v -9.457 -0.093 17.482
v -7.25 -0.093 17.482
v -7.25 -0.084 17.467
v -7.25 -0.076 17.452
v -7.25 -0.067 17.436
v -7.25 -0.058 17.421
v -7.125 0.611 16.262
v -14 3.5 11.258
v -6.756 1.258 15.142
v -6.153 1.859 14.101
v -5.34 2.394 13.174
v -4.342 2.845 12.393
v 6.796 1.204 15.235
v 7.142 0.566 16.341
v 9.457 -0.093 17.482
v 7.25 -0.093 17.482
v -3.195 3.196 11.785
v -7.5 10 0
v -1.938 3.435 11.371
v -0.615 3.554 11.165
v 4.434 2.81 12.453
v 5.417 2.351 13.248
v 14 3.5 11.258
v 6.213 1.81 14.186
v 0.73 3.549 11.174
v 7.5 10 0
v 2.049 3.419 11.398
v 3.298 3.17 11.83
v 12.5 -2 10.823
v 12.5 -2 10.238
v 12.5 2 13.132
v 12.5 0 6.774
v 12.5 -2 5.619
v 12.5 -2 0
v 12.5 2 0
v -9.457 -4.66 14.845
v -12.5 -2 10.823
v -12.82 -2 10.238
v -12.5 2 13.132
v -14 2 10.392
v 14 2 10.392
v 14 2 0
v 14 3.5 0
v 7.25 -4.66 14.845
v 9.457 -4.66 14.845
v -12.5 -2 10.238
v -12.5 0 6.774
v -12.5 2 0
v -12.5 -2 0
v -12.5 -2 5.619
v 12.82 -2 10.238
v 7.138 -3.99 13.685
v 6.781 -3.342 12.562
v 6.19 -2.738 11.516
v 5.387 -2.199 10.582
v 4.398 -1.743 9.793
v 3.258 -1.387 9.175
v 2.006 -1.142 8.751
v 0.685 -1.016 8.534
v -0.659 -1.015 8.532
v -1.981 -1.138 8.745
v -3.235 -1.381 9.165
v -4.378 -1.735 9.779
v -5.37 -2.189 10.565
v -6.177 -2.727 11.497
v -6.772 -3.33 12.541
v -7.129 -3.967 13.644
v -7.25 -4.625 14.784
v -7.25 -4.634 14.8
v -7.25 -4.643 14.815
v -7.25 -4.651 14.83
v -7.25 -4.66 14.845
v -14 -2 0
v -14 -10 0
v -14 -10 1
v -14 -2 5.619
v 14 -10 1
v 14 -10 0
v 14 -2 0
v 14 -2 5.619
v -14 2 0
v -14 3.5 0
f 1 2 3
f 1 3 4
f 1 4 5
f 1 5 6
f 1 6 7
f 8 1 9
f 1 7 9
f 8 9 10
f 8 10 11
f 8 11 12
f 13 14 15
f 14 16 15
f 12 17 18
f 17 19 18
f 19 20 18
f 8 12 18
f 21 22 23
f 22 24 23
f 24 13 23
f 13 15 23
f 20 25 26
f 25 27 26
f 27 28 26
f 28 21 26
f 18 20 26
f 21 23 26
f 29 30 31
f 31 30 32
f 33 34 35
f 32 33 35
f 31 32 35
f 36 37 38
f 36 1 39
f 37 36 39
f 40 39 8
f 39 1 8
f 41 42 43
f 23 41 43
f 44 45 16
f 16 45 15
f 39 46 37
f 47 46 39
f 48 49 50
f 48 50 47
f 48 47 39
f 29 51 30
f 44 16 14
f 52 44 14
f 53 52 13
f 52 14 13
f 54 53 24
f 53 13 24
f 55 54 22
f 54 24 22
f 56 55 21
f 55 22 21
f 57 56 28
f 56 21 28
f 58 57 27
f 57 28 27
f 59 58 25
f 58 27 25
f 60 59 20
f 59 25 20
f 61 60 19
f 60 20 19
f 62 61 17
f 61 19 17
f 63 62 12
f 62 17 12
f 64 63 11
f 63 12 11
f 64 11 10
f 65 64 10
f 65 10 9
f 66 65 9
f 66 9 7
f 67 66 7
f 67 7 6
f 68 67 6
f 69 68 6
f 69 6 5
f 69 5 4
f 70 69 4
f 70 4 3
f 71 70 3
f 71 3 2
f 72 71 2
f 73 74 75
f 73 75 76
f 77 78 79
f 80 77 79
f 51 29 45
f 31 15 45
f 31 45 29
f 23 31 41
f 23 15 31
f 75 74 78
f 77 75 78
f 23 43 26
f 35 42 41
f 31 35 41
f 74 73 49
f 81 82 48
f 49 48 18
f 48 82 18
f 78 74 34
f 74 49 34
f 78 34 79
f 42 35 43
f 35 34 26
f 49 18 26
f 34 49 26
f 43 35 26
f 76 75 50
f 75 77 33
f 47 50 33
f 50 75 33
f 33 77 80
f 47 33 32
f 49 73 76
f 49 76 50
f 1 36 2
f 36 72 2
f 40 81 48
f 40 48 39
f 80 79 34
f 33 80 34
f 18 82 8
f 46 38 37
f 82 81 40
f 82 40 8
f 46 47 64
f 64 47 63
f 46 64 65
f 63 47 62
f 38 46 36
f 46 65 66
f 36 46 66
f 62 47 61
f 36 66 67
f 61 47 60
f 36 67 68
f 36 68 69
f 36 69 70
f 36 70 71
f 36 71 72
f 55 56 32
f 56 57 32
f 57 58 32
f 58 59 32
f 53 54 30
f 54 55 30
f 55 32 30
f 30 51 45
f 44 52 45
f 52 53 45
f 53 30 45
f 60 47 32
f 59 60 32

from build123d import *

# Parameters (mm, degrees)
F0_W      = 28
F0_H      = 20
F1_DEPTH  = 20
F3_DEPTH  = 20
F6_DEPTH  = 17.5
F7_W      = 1.5
F7_H      = 4
F8_DEPTH  = 40
F12_DEPTH = 15
F15_D     = 14.5
F17_DEPTH = 20
F19_DEPTH = 12.5


with BuildPart() as f1:
    # F0 (on Top) → F1 (new body)
    with BuildSketch(Plane.XY):
        Rectangle(F0_W, F0_H)
    extrude(amount=F1_DEPTH)


with BuildPart() as f3:
    # F2 (on Top) → F3 (new body)
    with BuildSketch(Plane.XY):
        Polygon((-14, 3.5), (-7.5, 10), (-14, 10), align=None)
    extrude(amount=F3_DEPTH)


with BuildPart() as f4_1:
    # F4: instance of F3
    add(f3.part.mirror(Plane.YZ))


with BuildPart() as f6:
    # F5 (on Right) → F6 (new body, symmetric)
    with BuildSketch(Plane.YZ):
        Polygon((-4.741189, 25.532488), (10, 0), (10, 25.532488), align=None)
    extrude(amount=F6_DEPTH, both=True)


with BuildPart() as f8:
    # F7 (on Top) → F8 (new body)
    with BuildSketch(Plane.XY):
        with Locations((-13.25, 0)):
            Rectangle(F7_W, F7_H)
    extrude(amount=F8_DEPTH)


with BuildPart() as f9_1:
    # F9: instance of F8
    add(f8.part.mirror(Plane.YZ))


with BuildPart() as f1_1:
    add(f1.part)

    # F10: cut F3, F4_1, F6, F8, F9_1
    add(f3.part, mode=Mode.SUBTRACT)
    add(f4_1.part, mode=Mode.SUBTRACT)
    add(f6.part, mode=Mode.SUBTRACT)
    add(f8.part, mode=Mode.SUBTRACT)
    add(f9_1.part, mode=Mode.SUBTRACT)


with BuildPart() as f12:
    # F11 (on Right) → F12 (new body, symmetric)
    with BuildSketch(Plane.YZ):
        Polygon((-10, 24.094011), (-10, 1), (0, 6.773503), align=None)
    extrude(amount=F12_DEPTH, both=True)


with BuildPart() as f1_2:
    add(f1_1.part)

    # F13: cut F12
    add(f12.part, mode=Mode.SUBTRACT)

    # F15 (through all)
    with Locations(Plane(origin=(0, 2.933013, 1.693376), x_dir=(1, 0, 0), z_dir=(0, -0.866025, -0.5))):
        with Locations((0, 15.116025)):
            Hole(F15_D / 2)


with BuildPart() as f17:
    # F16 (on Right) → F17 (new body, symmetric)
    with BuildSketch(Plane.YZ):
        Polygon((-7.5, 13.205771), (6, 21), (-12, 21), align=None)
    extrude(amount=F17_DEPTH, both=True)


with BuildPart() as f19:
    # F18 (on face) → F19 (new body, symmetric)
    with BuildSketch(Plane(origin=(0, 7.5, 4.330127), x_dir=(-1, 0, 0), z_dir=(0, 0.866025, 0.5))):
        Polygon((14, 17.490759), (8, 17.490759), (14, 8), align=None)
    extrude(amount=F19_DEPTH, both=True)


with BuildPart() as f20_1:
    # F20: instance of F19
    add(f19.part.mirror(Plane.YZ))


with BuildPart() as f1_3:
    add(f1_2.part)

    # F21: cut F20_1, F19, F17
    add(f20_1.part, mode=Mode.SUBTRACT)
    add(f19.part, mode=Mode.SUBTRACT)
    add(f17.part, mode=Mode.SUBTRACT)


solid = f1_3.part
